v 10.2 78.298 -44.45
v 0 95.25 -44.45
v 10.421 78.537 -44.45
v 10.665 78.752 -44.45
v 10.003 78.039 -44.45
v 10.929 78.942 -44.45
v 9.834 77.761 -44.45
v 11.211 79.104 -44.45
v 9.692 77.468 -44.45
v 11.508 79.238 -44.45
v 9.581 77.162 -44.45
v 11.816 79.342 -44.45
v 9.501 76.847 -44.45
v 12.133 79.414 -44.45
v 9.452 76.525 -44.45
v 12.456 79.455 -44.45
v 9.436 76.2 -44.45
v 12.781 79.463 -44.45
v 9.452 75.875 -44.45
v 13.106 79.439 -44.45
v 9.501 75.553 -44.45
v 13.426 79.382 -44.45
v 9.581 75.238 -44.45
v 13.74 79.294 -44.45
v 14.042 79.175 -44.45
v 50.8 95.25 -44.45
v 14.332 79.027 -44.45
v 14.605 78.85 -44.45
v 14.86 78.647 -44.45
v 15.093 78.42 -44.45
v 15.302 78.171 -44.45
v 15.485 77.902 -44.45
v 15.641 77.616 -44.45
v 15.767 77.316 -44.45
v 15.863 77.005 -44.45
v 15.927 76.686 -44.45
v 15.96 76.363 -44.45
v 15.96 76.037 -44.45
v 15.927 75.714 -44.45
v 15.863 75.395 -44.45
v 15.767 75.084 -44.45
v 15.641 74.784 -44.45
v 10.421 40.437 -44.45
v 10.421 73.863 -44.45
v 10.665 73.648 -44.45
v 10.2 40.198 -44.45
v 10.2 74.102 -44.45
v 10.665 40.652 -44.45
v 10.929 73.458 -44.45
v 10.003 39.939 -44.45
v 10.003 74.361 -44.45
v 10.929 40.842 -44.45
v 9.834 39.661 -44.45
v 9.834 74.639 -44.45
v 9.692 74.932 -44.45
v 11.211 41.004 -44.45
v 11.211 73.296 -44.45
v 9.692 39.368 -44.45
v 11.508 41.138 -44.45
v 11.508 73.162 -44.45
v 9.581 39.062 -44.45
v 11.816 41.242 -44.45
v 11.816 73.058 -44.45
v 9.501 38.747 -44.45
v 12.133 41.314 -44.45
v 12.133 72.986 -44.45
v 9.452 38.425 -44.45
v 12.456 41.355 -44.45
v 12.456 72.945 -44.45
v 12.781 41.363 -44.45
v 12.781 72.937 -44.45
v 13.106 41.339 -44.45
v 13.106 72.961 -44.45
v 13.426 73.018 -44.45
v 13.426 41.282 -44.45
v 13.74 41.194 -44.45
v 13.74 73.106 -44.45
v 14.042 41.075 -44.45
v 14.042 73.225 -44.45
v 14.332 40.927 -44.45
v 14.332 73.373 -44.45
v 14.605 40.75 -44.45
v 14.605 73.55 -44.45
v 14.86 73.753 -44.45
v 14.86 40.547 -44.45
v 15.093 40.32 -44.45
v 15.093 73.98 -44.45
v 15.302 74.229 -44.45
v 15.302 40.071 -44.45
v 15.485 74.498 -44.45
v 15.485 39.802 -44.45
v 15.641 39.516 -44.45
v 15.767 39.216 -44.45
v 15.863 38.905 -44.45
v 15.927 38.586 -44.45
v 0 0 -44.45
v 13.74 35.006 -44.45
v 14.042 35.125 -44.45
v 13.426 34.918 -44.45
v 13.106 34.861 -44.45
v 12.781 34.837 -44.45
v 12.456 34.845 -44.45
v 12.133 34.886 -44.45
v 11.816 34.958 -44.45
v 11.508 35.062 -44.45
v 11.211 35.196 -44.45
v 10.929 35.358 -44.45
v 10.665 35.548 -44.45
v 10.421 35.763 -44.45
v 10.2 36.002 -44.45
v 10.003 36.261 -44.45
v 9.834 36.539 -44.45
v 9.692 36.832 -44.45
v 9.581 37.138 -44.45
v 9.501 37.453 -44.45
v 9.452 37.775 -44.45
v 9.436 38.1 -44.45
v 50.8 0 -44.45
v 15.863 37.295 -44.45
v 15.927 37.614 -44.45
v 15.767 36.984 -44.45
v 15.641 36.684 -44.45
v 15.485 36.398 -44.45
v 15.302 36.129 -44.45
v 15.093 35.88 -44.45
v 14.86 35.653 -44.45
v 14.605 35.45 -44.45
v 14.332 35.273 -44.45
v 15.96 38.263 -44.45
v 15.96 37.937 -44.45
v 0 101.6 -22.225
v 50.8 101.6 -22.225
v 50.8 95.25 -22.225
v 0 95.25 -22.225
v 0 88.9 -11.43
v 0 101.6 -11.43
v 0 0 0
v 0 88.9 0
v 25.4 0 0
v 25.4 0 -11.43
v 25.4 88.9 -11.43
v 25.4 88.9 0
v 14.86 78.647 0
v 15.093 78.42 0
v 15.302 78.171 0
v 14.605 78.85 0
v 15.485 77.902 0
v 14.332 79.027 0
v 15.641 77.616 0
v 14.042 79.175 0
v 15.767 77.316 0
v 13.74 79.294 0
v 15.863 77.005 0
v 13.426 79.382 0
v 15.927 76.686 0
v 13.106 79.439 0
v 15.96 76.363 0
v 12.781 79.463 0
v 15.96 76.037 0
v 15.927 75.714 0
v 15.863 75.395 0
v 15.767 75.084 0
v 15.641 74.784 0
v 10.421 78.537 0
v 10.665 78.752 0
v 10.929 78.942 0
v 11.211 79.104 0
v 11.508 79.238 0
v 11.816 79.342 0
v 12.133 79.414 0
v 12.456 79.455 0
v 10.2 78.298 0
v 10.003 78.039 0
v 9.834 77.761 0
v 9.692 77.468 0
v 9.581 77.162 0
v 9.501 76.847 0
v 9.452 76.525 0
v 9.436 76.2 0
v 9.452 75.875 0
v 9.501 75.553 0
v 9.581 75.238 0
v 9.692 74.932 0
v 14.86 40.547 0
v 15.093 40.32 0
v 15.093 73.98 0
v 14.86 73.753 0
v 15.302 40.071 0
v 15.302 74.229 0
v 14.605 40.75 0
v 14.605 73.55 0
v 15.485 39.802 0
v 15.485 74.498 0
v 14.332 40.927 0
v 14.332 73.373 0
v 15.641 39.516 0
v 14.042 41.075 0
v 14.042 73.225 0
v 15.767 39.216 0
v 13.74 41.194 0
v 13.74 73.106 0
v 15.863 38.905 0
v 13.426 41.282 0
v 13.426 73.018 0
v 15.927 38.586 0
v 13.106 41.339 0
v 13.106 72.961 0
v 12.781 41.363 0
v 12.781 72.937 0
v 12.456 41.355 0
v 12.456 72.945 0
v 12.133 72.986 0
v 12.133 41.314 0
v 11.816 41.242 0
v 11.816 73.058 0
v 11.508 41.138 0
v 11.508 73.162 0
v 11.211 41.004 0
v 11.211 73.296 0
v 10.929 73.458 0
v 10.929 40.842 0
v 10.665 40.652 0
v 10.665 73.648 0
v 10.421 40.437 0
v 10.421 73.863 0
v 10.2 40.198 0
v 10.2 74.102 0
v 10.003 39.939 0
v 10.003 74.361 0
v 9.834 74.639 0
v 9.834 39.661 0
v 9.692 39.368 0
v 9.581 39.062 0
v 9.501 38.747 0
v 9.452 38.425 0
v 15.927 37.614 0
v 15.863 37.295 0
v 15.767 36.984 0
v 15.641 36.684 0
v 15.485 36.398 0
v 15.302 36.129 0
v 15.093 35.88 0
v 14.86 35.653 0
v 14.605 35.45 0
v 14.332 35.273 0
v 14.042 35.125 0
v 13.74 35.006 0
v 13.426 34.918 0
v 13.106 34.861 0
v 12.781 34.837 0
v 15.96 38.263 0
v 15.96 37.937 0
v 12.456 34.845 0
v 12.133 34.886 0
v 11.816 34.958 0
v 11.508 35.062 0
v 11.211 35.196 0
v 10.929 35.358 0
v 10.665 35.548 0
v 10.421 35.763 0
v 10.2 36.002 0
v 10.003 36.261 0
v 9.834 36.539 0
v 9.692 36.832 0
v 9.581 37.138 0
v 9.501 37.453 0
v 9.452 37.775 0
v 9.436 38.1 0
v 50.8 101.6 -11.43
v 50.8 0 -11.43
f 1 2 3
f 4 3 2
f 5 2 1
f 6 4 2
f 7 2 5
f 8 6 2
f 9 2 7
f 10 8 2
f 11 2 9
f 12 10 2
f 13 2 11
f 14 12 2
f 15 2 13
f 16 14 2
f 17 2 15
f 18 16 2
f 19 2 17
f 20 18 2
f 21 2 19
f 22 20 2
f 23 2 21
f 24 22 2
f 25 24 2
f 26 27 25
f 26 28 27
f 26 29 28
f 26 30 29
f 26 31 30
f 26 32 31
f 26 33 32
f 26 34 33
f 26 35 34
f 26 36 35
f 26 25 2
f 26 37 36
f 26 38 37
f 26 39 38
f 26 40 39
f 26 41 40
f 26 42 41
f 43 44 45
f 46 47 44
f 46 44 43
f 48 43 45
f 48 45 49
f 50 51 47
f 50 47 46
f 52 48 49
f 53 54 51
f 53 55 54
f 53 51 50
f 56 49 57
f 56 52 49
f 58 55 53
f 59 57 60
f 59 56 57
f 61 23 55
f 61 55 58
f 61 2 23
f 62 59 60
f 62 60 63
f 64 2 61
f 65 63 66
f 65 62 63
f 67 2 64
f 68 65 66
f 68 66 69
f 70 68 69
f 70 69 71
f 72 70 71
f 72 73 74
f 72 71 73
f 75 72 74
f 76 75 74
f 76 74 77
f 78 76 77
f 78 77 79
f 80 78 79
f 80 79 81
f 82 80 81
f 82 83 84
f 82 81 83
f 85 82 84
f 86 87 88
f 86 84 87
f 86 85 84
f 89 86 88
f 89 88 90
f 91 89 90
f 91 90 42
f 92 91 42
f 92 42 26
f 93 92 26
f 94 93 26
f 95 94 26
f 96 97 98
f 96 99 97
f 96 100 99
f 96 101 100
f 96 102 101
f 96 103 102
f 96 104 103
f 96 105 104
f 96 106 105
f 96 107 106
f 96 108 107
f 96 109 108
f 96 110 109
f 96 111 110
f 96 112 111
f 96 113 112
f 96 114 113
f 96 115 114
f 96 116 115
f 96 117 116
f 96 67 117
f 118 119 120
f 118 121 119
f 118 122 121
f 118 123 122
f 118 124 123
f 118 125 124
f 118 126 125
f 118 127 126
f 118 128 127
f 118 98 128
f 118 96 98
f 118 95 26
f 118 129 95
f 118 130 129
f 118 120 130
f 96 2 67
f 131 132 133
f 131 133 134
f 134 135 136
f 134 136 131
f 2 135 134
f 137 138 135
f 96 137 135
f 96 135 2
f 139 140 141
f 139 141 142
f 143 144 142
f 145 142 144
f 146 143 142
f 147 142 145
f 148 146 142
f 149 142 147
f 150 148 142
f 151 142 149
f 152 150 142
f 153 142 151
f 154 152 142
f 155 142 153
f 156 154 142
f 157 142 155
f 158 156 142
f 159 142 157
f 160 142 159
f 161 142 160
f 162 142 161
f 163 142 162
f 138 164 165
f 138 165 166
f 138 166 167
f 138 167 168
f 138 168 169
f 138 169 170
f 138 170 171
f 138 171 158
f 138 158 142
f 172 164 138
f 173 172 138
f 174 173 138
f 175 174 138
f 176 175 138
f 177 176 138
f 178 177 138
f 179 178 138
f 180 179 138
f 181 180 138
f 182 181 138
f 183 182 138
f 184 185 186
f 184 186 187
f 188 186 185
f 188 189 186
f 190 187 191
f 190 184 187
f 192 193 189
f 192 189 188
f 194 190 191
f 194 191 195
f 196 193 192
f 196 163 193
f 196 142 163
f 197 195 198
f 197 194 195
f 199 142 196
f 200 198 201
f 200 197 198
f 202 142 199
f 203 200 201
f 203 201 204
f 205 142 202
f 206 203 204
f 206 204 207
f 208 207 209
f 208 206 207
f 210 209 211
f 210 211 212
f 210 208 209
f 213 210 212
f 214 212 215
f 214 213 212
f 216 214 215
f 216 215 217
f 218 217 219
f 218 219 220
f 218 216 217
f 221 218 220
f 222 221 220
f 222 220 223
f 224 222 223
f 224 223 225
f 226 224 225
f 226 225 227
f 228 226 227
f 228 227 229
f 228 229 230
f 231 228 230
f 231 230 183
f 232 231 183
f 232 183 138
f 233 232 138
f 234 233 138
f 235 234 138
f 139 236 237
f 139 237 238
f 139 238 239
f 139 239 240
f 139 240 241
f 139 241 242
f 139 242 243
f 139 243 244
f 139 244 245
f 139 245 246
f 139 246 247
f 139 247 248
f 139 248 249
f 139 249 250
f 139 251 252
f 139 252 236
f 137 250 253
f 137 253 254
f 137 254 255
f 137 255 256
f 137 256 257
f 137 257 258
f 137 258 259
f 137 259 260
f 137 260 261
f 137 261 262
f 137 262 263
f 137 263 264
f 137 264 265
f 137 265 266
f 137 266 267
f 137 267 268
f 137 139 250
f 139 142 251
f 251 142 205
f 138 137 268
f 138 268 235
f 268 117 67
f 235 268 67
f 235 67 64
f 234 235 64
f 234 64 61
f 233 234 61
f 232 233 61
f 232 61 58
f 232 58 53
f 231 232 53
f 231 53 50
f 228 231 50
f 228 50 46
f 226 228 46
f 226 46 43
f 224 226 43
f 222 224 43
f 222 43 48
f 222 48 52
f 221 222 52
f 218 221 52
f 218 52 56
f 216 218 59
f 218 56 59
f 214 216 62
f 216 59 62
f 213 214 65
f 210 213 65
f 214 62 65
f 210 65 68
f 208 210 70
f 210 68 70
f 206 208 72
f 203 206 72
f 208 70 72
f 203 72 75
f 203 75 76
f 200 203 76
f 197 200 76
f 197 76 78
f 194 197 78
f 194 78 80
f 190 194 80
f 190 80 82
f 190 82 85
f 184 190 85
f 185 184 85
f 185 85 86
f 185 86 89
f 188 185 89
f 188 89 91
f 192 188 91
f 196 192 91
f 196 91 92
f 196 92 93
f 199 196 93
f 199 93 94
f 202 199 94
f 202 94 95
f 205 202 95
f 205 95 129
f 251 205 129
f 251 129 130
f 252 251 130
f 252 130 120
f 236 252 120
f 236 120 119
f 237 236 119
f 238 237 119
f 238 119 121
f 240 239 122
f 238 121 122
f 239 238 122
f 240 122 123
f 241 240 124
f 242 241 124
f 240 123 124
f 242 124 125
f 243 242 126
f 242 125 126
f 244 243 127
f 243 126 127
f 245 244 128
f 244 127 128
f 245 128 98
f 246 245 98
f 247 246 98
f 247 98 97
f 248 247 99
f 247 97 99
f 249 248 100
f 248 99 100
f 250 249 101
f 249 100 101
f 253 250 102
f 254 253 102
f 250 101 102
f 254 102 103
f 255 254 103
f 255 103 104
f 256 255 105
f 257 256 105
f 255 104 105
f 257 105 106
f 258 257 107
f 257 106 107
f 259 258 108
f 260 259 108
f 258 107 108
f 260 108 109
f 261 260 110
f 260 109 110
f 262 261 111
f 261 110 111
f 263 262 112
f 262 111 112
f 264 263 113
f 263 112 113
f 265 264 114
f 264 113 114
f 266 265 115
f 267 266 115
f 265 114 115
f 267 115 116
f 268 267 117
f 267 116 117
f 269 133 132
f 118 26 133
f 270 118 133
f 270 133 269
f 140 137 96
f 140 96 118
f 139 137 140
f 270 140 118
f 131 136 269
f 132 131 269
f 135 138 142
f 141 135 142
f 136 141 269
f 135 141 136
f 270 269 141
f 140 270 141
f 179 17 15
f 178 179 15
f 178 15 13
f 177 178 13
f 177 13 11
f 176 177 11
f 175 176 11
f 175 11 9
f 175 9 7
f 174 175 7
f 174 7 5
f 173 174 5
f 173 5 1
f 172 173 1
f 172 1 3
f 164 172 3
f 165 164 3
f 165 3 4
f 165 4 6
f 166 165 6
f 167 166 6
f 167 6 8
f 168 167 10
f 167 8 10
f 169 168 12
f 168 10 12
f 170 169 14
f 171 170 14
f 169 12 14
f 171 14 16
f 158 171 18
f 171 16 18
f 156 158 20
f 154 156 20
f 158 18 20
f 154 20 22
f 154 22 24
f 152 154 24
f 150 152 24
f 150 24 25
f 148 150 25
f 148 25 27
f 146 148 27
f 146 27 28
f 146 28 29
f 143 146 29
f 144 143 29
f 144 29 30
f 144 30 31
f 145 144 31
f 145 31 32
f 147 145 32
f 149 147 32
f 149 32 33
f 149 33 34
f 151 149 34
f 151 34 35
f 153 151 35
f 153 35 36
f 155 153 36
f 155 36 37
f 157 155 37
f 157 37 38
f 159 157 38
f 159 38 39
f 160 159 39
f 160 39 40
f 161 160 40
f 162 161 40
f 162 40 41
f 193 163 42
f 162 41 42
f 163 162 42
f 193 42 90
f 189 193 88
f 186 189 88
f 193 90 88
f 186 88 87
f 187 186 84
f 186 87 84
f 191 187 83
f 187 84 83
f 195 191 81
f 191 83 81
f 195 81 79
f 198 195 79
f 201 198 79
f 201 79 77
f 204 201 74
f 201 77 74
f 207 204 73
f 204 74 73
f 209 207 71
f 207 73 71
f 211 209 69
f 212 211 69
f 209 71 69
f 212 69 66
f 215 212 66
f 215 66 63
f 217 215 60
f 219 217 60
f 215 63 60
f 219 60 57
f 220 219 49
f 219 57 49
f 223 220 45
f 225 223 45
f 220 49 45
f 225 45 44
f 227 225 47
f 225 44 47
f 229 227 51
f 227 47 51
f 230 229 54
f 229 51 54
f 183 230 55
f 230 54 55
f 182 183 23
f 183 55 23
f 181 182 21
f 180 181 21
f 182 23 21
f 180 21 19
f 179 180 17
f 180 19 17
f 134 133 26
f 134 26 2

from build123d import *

# Parameters (mm, degrees)
F1_DEPTH = 101.6
F2_W     = 50.8
F2_H     = 22.225
F3_DEPTH = 6.35
F4_W     = 25.4
F4_H     = 12.7
F5_DEPTH = 11.43
F7_D     = 6.5278


with BuildPart() as f1:
    # F0 (on Front) → F1 (new body)
    with BuildSketch(Plane.XZ):
        Polygon((25.4, 0), (0, 0), (0, -44.45), (50.8, -44.45), (50.8, -11.43), (25.4, -11.43), align=None)
    extrude(amount=-F1_DEPTH)

    # F2 (on face) → F3 (cut)
    with BuildSketch(Plane(origin=(0, 101.6, 0), x_dir=(-1, 0, 0), z_dir=(0, 1, 0))):
        with Locations((-25.4, -33.3375)):
            Rectangle(F2_W, F2_H)
    extrude(amount=-F3_DEPTH, mode=Mode.SUBTRACT)

    # F4 (on face) → F5 (cut, through all)
    with BuildSketch(Plane.XY):
        with Locations((12.7, 95.25)):
            Rectangle(F4_W, F4_H)
    extrude(amount=-F5_DEPTH, mode=Mode.SUBTRACT)

    # F7 (through all)
    with Locations(Plane.XY):
        with Locations((12.7, 76.2), (12.7, 38.1)):
            Hole(F7_D / 2)


solid = f1.part
